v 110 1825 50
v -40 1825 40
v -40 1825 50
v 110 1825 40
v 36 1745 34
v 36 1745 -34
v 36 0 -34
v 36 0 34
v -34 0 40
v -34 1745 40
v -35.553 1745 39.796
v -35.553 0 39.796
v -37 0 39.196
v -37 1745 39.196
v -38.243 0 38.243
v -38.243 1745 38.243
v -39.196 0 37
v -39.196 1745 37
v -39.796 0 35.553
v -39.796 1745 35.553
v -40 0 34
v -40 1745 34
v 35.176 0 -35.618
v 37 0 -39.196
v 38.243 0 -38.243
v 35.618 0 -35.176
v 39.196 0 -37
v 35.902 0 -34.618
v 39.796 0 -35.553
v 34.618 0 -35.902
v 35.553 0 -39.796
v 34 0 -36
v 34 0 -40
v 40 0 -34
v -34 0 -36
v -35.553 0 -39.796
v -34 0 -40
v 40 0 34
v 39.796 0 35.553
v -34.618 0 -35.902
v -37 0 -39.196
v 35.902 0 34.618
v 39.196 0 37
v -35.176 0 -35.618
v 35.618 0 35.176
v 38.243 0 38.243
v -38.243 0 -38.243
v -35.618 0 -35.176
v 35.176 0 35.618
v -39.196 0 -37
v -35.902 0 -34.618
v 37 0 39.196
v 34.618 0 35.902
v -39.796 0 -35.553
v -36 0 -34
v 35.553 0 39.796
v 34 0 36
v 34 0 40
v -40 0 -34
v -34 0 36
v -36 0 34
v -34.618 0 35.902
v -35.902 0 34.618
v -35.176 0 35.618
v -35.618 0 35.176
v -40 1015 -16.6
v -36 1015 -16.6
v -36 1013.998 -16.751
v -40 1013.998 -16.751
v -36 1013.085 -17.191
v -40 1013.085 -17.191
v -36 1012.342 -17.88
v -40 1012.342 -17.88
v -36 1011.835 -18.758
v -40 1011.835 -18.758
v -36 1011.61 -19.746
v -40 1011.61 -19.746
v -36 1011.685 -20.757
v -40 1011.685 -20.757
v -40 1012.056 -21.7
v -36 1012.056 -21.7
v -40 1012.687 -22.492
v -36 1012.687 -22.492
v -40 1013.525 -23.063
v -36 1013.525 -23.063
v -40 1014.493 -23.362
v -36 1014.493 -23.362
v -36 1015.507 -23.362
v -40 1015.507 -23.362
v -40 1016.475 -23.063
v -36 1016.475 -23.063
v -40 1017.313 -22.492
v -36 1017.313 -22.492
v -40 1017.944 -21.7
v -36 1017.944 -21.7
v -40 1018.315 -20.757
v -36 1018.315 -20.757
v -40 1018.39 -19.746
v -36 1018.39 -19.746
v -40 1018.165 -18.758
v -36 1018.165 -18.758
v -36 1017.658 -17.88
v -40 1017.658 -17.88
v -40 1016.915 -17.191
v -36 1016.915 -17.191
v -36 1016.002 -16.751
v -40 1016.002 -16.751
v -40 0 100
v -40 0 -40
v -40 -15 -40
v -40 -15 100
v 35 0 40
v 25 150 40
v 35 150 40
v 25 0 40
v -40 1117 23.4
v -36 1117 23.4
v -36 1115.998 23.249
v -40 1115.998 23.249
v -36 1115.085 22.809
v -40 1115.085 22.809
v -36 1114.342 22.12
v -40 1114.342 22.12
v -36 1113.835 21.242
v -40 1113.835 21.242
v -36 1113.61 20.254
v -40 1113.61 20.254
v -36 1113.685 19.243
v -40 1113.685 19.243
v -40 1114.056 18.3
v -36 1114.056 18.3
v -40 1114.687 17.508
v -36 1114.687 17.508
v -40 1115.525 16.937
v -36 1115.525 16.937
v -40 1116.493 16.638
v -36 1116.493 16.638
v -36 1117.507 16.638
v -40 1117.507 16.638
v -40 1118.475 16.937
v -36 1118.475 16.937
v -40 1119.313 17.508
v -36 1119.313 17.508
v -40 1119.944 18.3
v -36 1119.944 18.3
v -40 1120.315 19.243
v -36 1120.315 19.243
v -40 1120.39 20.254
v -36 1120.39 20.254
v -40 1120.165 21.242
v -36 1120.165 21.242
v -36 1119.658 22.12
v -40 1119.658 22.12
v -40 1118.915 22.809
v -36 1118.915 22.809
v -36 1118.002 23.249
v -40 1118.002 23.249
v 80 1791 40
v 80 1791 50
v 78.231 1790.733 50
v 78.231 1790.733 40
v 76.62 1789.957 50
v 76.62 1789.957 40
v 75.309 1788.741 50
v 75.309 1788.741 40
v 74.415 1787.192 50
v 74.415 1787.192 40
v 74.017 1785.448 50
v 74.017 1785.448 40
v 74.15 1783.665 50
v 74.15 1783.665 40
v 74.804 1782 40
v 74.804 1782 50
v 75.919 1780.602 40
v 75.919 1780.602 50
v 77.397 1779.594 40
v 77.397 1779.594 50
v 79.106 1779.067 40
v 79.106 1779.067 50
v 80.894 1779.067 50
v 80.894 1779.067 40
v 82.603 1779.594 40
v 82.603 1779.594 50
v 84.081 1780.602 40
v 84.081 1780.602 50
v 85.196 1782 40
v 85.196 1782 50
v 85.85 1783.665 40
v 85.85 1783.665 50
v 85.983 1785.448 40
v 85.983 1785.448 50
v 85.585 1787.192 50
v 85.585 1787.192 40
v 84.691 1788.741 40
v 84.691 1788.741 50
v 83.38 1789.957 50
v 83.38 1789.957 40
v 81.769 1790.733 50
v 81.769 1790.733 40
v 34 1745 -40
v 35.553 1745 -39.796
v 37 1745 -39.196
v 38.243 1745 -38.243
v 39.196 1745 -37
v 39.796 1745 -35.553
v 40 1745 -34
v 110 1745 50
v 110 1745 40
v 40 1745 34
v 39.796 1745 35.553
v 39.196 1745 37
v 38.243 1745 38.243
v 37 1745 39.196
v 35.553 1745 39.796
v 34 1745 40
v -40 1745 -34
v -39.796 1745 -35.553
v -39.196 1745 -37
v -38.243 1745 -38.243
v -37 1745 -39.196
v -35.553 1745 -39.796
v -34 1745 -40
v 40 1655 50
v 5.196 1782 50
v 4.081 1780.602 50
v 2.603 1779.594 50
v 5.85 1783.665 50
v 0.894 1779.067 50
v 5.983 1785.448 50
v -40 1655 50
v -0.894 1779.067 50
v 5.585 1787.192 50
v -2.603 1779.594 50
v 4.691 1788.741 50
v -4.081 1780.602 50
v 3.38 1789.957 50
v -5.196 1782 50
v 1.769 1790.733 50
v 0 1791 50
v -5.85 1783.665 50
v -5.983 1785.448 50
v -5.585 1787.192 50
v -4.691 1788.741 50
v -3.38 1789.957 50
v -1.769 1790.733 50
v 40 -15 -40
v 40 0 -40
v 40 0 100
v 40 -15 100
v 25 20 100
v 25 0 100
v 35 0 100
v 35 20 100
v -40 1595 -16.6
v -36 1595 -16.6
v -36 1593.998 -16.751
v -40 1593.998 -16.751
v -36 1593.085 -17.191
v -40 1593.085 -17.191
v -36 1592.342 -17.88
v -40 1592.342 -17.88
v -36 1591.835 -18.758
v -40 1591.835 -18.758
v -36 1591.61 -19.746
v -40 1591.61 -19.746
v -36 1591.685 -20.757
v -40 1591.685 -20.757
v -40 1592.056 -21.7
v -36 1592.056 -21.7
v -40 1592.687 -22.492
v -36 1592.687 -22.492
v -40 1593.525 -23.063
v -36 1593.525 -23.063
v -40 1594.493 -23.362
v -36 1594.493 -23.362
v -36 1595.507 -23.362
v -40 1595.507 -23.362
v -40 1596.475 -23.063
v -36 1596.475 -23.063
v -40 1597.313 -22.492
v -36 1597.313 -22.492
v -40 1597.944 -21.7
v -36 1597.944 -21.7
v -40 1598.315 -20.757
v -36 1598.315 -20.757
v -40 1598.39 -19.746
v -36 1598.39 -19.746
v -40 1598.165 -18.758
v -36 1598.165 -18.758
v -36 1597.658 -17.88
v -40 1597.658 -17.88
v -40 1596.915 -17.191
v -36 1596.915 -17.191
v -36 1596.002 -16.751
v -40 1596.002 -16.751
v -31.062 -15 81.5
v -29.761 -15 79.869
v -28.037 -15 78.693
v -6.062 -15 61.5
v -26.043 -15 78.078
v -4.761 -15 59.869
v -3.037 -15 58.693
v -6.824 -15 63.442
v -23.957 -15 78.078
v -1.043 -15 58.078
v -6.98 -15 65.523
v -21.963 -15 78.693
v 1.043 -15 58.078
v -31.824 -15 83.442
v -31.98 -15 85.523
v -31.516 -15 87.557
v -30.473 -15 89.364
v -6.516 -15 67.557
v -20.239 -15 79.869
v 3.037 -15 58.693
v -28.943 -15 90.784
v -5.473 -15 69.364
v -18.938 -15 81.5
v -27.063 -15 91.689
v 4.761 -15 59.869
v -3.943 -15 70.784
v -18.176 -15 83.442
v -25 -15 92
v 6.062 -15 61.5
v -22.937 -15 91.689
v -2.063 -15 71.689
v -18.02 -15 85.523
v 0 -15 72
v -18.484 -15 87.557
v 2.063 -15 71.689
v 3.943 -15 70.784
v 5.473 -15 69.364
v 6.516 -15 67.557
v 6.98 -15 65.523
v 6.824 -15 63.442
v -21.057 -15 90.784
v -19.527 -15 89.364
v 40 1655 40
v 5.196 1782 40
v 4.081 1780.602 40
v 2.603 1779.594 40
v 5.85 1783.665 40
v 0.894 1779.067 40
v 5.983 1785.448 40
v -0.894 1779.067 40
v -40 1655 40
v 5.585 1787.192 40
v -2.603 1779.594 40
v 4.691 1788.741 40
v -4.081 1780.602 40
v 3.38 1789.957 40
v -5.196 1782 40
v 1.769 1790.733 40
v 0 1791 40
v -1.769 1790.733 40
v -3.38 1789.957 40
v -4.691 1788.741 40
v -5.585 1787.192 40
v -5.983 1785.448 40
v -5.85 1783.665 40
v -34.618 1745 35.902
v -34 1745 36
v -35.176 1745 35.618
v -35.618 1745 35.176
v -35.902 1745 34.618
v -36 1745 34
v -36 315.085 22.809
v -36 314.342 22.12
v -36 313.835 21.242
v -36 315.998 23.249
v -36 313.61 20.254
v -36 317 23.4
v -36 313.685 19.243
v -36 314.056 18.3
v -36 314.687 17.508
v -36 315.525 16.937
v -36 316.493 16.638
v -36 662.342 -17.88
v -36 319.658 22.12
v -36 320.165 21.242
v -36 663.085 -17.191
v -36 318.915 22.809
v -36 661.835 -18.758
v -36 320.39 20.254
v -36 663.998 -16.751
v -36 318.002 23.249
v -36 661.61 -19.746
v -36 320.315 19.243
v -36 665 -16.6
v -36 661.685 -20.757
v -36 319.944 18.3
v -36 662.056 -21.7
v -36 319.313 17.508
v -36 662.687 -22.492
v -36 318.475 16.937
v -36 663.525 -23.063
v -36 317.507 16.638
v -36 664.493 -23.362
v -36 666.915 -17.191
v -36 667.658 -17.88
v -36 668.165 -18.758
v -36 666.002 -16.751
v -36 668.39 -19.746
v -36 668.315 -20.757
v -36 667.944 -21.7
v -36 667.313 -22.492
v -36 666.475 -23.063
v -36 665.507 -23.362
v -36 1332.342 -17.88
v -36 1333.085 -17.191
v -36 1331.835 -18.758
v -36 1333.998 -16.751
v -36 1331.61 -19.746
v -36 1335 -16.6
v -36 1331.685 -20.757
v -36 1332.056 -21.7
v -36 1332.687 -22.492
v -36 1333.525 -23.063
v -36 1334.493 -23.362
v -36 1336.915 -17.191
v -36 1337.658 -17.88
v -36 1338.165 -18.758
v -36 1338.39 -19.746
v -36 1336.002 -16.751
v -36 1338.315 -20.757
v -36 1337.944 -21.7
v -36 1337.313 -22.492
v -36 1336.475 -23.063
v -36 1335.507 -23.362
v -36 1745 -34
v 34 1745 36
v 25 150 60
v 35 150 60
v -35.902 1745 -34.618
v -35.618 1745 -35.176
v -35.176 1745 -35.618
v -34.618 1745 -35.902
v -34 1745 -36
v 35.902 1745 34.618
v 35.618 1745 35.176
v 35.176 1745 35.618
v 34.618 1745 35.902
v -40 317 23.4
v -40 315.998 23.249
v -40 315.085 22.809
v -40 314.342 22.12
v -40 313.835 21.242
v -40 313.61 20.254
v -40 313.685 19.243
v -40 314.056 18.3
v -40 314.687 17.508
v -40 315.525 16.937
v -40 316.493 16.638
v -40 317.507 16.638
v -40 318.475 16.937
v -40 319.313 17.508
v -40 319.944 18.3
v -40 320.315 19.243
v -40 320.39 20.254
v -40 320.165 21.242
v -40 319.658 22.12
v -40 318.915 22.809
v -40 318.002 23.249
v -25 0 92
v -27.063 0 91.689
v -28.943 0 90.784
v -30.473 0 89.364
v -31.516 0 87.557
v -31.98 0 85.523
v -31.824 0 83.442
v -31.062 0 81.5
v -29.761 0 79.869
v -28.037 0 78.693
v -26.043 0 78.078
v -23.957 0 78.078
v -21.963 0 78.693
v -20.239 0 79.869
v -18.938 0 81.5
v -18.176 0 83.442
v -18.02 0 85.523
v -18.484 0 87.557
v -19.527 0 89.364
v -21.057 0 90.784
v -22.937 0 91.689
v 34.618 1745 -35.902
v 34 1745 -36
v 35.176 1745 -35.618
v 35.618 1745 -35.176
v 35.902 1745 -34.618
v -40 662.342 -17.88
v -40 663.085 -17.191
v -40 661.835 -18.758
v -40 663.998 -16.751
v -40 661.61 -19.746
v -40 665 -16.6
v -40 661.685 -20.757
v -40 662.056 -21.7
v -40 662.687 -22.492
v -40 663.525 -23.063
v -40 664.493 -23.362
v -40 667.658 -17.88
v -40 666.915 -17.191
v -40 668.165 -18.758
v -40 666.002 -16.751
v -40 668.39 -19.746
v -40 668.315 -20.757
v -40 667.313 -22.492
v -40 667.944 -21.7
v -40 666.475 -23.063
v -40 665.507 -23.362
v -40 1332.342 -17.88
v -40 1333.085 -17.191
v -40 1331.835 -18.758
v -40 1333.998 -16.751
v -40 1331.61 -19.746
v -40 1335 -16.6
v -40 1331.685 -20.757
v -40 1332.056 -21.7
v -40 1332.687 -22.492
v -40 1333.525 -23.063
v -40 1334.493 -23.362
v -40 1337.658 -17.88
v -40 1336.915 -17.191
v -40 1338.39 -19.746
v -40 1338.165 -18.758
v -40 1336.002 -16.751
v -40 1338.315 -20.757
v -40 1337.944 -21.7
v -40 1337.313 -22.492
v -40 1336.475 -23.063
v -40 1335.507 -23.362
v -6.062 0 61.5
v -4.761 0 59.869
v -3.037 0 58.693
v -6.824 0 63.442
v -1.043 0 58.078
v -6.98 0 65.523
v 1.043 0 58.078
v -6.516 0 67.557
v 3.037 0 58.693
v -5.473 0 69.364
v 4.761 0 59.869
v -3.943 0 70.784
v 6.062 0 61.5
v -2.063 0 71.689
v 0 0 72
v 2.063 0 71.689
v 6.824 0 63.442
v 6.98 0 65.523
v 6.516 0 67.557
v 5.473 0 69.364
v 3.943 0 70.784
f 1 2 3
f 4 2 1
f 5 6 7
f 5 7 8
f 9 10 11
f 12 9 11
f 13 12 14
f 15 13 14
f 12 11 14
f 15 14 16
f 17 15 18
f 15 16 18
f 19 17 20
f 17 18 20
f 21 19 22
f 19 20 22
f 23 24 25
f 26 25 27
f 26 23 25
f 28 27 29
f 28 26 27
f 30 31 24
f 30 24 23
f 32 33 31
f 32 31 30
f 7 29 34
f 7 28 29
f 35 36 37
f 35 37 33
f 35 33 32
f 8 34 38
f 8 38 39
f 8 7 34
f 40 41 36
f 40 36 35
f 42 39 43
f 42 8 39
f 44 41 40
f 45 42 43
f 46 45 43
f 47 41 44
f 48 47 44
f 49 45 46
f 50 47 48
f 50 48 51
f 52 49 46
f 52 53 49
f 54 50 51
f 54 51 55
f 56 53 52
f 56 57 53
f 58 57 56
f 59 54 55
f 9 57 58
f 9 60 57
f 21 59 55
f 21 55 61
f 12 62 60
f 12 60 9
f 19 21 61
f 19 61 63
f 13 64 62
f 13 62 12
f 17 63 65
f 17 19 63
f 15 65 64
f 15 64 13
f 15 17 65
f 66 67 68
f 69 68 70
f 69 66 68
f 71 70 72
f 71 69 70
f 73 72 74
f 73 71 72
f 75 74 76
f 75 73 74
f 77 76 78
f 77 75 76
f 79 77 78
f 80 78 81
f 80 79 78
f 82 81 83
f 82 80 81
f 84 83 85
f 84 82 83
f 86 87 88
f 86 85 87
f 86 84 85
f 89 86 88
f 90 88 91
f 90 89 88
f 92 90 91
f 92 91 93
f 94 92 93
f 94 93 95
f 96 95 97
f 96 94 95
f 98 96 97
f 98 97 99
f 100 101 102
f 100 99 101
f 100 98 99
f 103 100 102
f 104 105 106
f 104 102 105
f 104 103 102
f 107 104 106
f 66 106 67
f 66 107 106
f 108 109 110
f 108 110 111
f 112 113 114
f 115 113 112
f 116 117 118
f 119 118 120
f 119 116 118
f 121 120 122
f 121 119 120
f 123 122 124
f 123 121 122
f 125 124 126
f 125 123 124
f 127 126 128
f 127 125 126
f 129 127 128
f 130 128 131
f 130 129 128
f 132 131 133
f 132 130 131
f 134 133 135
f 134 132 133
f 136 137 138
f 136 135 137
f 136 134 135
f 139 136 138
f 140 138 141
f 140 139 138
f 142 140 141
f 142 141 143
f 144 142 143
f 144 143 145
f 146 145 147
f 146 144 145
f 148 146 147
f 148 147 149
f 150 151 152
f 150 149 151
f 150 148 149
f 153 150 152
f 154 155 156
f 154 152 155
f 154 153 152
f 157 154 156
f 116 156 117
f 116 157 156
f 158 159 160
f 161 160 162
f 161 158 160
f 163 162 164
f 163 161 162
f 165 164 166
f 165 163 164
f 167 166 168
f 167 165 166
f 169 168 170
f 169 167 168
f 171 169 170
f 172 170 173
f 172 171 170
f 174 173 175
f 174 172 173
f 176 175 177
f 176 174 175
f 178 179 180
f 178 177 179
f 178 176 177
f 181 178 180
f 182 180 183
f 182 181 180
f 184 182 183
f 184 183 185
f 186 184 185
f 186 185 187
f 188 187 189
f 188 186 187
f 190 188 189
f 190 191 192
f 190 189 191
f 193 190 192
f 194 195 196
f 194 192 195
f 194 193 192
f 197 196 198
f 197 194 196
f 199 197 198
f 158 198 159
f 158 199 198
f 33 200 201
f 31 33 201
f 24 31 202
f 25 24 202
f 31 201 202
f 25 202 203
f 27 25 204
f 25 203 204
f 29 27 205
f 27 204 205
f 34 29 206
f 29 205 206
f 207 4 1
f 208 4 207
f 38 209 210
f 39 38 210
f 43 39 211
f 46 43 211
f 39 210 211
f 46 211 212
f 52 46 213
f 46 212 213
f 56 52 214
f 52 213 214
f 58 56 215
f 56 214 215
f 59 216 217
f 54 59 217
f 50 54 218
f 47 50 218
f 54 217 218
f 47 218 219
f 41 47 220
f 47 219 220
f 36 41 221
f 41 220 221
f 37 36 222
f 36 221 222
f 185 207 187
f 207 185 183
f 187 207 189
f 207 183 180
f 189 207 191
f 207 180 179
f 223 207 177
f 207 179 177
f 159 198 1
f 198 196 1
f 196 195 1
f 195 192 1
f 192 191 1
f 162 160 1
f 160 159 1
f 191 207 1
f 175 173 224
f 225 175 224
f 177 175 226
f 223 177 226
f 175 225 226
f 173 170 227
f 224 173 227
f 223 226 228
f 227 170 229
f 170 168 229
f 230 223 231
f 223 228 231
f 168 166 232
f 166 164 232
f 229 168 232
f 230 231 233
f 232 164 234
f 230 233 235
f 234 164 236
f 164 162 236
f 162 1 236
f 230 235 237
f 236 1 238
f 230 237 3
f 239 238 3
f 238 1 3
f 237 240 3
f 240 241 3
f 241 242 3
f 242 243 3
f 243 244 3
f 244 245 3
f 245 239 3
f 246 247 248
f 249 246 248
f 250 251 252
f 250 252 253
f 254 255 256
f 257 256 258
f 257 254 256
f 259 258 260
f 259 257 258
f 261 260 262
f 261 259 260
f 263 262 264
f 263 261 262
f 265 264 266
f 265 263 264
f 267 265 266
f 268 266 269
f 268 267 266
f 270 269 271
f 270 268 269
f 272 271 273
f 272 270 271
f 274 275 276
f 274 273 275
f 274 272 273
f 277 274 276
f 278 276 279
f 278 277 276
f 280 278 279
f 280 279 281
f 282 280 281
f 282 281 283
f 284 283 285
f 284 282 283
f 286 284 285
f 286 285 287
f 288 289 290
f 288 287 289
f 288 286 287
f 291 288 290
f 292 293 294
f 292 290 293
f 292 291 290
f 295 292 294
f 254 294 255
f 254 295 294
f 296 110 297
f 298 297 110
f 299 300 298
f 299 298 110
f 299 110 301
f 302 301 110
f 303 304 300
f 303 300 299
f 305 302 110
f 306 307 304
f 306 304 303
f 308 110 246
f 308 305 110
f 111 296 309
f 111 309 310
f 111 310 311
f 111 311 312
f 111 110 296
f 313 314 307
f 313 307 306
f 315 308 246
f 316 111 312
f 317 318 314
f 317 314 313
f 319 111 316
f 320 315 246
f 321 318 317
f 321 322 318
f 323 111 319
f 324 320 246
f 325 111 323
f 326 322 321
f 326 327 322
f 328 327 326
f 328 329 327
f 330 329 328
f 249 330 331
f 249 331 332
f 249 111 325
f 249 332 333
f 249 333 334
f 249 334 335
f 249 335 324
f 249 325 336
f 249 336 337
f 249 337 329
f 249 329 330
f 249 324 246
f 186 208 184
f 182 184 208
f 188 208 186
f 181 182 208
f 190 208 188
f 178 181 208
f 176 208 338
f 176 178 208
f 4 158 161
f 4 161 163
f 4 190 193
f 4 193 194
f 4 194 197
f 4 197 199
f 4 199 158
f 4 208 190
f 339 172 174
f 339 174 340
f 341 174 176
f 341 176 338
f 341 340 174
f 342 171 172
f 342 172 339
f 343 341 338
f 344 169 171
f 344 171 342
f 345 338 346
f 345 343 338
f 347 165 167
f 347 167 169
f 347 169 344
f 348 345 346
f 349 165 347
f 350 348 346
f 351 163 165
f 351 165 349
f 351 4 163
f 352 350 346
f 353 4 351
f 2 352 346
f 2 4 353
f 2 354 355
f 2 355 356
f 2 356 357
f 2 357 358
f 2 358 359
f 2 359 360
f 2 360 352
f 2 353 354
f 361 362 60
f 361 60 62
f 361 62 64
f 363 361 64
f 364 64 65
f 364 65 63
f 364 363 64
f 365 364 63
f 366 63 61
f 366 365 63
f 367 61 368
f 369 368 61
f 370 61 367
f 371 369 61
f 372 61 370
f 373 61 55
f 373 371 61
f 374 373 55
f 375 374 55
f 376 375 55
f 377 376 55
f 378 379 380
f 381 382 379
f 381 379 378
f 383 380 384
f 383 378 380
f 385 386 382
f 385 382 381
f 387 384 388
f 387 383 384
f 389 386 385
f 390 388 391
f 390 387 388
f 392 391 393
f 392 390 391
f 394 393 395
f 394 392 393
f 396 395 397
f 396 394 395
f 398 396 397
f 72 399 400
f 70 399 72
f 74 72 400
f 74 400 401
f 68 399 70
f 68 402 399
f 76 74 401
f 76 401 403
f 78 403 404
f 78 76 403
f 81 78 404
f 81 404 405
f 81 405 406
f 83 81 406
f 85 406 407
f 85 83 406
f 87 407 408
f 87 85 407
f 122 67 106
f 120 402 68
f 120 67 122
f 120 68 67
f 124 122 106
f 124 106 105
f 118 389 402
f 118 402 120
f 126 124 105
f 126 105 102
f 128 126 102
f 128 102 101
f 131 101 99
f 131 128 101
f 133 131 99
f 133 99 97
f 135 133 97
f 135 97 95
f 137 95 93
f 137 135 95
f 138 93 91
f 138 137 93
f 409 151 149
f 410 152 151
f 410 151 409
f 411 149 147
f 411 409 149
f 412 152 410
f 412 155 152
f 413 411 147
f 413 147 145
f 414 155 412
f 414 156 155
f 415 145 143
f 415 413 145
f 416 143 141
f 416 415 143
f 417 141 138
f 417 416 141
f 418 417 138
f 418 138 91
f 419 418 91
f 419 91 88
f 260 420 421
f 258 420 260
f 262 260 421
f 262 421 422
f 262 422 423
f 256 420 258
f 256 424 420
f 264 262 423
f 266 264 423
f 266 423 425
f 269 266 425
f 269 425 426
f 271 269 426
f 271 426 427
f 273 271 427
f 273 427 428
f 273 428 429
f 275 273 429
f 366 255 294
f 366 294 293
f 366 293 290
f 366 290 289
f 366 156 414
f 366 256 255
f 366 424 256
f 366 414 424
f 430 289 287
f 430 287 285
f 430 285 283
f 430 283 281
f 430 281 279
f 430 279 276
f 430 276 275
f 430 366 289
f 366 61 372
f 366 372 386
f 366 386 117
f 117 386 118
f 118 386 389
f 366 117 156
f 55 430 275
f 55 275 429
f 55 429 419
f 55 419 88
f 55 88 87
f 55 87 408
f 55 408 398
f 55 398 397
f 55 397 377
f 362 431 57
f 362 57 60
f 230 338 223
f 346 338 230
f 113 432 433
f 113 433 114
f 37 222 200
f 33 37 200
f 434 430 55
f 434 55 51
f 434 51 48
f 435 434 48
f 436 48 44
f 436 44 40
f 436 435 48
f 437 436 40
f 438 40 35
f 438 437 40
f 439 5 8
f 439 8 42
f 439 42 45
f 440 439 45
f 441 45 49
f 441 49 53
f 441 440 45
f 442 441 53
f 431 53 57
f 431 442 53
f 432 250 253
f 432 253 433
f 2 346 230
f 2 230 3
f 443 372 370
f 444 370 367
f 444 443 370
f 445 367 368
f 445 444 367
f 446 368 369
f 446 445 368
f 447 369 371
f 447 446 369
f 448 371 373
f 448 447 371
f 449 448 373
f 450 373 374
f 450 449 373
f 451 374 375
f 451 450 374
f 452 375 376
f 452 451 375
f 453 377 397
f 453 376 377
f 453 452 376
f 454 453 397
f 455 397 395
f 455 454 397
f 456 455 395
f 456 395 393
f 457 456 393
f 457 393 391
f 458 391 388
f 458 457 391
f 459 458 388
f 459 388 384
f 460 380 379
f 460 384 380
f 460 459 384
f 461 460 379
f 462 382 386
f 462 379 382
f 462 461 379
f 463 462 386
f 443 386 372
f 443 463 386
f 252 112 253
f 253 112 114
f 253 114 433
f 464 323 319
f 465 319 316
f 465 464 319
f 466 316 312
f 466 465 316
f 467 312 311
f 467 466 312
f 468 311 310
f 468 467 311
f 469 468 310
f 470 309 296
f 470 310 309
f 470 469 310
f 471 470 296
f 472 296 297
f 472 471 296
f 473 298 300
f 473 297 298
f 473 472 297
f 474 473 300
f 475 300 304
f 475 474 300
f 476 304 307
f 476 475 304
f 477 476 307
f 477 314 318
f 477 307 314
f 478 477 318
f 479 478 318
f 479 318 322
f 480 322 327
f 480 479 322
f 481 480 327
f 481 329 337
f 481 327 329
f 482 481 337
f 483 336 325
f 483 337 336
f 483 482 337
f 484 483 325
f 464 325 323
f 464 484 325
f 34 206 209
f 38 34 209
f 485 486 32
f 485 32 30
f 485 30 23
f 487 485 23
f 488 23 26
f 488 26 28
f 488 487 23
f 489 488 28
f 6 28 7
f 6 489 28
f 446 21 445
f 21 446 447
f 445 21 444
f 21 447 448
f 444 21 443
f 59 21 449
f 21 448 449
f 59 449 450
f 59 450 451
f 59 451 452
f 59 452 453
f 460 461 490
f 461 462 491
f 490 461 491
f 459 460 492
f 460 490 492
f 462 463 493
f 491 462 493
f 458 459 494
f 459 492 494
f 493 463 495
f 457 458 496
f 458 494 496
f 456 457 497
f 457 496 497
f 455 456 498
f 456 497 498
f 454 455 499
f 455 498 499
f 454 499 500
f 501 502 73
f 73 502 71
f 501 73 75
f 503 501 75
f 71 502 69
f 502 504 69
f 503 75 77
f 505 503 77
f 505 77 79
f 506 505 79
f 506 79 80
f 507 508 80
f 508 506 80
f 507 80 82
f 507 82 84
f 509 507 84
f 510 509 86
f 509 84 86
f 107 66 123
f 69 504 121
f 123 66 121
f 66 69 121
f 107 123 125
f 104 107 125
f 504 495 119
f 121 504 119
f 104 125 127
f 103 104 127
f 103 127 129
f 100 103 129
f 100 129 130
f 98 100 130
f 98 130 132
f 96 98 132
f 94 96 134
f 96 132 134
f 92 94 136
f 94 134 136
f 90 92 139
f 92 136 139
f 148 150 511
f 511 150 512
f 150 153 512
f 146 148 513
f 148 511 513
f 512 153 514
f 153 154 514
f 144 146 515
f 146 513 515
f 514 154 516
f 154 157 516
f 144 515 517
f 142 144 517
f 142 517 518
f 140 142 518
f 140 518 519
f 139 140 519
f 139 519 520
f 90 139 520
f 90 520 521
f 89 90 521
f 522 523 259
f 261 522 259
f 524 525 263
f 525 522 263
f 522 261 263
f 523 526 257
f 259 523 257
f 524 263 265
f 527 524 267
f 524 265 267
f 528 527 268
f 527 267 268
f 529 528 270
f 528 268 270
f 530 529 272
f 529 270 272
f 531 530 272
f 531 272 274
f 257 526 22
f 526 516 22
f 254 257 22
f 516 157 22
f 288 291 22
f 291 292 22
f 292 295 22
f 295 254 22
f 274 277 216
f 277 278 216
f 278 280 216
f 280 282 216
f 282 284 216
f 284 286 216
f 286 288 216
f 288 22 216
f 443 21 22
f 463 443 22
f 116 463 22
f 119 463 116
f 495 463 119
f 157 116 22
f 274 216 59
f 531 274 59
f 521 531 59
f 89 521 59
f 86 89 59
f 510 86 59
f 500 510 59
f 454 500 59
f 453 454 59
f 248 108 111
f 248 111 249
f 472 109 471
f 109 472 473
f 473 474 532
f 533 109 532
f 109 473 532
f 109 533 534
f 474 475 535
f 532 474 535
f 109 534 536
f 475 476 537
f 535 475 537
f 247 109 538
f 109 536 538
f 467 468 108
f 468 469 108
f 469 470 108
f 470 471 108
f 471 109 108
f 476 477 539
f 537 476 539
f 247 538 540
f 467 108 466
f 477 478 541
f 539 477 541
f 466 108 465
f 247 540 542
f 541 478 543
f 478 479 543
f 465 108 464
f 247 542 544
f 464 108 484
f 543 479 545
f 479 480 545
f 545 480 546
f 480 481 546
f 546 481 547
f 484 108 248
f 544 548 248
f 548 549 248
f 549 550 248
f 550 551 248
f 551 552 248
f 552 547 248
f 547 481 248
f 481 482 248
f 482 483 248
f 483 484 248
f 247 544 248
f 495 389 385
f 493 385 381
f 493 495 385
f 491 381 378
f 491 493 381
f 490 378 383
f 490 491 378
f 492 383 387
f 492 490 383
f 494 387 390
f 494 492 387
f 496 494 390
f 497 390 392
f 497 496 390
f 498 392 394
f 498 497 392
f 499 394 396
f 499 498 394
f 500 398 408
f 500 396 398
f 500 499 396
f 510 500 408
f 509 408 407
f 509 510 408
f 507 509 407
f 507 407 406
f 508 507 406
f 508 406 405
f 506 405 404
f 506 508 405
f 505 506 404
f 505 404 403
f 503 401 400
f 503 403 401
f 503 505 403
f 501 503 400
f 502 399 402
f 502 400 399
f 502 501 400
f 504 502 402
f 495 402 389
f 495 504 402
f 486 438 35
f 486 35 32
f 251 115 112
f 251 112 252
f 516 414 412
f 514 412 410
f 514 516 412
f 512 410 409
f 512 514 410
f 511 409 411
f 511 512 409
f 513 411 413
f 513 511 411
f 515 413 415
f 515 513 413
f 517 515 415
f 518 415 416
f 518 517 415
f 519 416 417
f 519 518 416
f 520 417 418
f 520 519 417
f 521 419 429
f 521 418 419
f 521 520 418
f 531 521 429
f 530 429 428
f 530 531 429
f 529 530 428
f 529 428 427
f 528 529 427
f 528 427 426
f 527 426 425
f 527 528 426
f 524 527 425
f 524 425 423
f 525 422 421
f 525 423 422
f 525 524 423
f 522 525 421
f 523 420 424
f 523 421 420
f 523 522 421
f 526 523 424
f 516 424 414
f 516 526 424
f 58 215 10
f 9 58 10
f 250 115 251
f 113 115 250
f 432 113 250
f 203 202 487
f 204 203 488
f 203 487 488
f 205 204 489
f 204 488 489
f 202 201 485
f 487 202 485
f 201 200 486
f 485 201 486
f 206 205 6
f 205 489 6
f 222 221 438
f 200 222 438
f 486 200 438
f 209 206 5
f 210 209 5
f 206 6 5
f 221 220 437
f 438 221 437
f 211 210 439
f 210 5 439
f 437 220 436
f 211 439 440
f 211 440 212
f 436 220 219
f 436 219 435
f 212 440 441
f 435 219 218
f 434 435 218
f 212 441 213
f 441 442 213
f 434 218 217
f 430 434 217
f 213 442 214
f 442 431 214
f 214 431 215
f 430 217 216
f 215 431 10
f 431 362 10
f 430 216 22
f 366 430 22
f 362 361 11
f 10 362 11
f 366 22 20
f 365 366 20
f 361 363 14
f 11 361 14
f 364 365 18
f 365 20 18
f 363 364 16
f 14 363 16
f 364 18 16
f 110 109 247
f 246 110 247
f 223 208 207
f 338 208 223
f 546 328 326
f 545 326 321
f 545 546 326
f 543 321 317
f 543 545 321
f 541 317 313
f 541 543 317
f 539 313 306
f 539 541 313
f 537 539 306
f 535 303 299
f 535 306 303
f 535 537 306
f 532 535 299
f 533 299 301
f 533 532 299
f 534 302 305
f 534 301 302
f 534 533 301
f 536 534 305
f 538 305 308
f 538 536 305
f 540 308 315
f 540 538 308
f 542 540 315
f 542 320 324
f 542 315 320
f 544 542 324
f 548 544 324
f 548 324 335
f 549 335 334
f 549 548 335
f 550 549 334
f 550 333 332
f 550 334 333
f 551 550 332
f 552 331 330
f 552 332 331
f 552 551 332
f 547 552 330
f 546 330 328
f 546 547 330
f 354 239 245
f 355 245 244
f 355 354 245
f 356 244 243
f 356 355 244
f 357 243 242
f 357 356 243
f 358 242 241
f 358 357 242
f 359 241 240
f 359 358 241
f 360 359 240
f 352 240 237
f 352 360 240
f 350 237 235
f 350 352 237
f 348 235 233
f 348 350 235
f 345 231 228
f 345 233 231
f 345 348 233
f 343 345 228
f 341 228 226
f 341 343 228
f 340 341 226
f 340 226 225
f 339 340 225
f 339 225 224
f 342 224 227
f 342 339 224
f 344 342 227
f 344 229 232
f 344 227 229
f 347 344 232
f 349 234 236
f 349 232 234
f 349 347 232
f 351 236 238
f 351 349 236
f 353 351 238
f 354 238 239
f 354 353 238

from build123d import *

# Parameters (mm, degrees)
MEMBER_1_DEPTH                   = 1745
SKETCH_4_W                       = 80
SKETCH_4_H                       = 140
EXTRUDE_1_DEPTH                  = 15
HOLE_WIZARD_14_0_14_1_AT_2_COUNT = 2
HOLE_WIZARD_14_0_14_1_AT_2_PITCH = 32.015621187
EXTRUDE_2_DEPTH                  = 10
EXTRUDE_3_DEPTH                  = 10
HOLE_WIZARD_M10_1_AT_2_COUNT     = 2
HOLE_WIZARD_M10_1_AT_2_PITCH     = 80
HOLE_WIZARD_M8_2_AT_2_COUNT      = 2
HOLE_WIZARD_M8_2_AT_2_PITCH      = 670
HOLE_WIZARD_M8_2_AT_3_COUNT      = 2
HOLE_WIZARD_M8_2_AT_3_PITCH      = 350
HOLE_WIZARD_M8_2_AT_4_COUNT      = 2
HOLE_WIZARD_M8_2_AT_4_PITCH      = 930
HOLE_WIZARD_M8_7_AT_2_COUNT      = 2
HOLE_WIZARD_M8_7_AT_2_PITCH      = 800


with BuildPart() as part:
    # Sketch11 → Member 1 (new body)
    with BuildSketch(Plane(origin=(0, 1745, 0), x_dir=(0, 0, 1), z_dir=(0, -1, 0))):
        with BuildLine():
            Line((-34, -40), (34, -40))
            ThreePointArc((34, -40), (38.242640687, -38.242640687), (40, -34))
            Line((40, -34), (40, 34))
            ThreePointArc((40, 34), (38.242640687, 38.242640687), (34, 40))
            Line((34, 40), (-34, 40))
            ThreePointArc((-34, 40), (-38.242640687, 38.242640687), (-40, 34))
            Line((-40, 34), (-40, -34))
            ThreePointArc((-40, -34), (-38.242640687, -38.242640687), (-34, -40))
        make_face()
        with BuildLine():
            Line((-34, -36), (34, -36))
            ThreePointArc((34, -36), (35.414213562, -35.414213562), (36, -34))
            Line((36, -34), (36, 34))
            ThreePointArc((36, 34), (35.414213562, 35.414213562), (34, 36))
            Line((34, 36), (-34, 36))
            ThreePointArc((-34, 36), (-35.414213562, 35.414213562), (-36, 34))
            Line((-36, 34), (-36, -34))
            ThreePointArc((-36, -34), (-35.414213562, -35.414213562), (-34, -36))
        make_face(mode=Mode.SUBTRACT)
    extrude(amount=MEMBER_1_DEPTH)

    # 草图33 → M8 螺纹孔2 (revolve, cut)
    with BuildSketch(Plane(origin=(-40, 665, -20), x_dir=(0, 0, 1), z_dir=(0, 1, 0))):
        Polygon((0, 0), (0, 21.792926105), (3.4, 19.75), (3.4, 0), align=None)
    hole_wizard_m8_2 = revolve(axis=Axis((-46.35, 665, -20), (1, 0, 0)), mode=Mode.SUBTRACT)

    # M8 螺纹孔2 at 2: M8 螺纹孔2 ×2
    with Locations(*[(0, i * HOLE_WIZARD_M8_2_AT_2_PITCH, 0) for i in range(1, HOLE_WIZARD_M8_2_AT_2_COUNT)]):
        add(hole_wizard_m8_2, mode=Mode.SUBTRACT)

    # M8 螺纹孔2 at 3: M8 螺纹孔2 ×2
    with Locations(*[(0, i * HOLE_WIZARD_M8_2_AT_3_PITCH, 0) for i in range(1, HOLE_WIZARD_M8_2_AT_3_COUNT)]):
        add(hole_wizard_m8_2, mode=Mode.SUBTRACT)

    # M8 螺纹孔2 at 4: M8 螺纹孔2 ×2
    with Locations(*[(0, i * HOLE_WIZARD_M8_2_AT_4_PITCH, 0) for i in range(1, HOLE_WIZARD_M8_2_AT_4_COUNT)]):
        add(hole_wizard_m8_2, mode=Mode.SUBTRACT)

    # 草图43 → M8 螺纹孔7 (revolve, cut)
    with BuildSketch(Plane(origin=(-40, 1117, 20.000000001), x_dir=(0, 0, 1), z_dir=(0, 1, 0))):
        Polygon((0, 0), (0, 24.292926105), (3.4, 22.25), (3.4, 0), align=None)
    hole_wizard_m8_7 = revolve(axis=Axis((-46.35, 1117, 20.000000001), (1, 0, 0)), mode=Mode.SUBTRACT)

    # M8 螺纹孔7 at 2: M8 螺纹孔7 ×2
    with Locations(*[(0, -i * HOLE_WIZARD_M8_7_AT_2_PITCH, 0) for i in range(1, HOLE_WIZARD_M8_7_AT_2_COUNT)]):
        add(hole_wizard_m8_7, mode=Mode.SUBTRACT)


with BuildPart() as body_2:
    # 草图4 → 凸台-拉伸1 (new body)
    with BuildSketch(Plane.XZ):
        with Locations((0, 30)):
            Rectangle(SKETCH_4_W, SKETCH_4_H)
    extrude(amount=EXTRUDE_1_DEPTH)

    # 草图12 → Ø14.0 (14) 直径孔1 (revolve, cut)
    with BuildSketch(Plane(origin=(-25, 0, 85), x_dir=(0, 0, 1), z_dir=(1, 0, 0))):
        Polygon((0, 0), (0, 44.206024333), (7, 40), (7, 0), align=None)
    hole_wizard_14_0_14_1 = revolve(axis=Axis((-25, 6.35, 85), (0, -1, 0)), mode=Mode.SUBTRACT)

    # Ø14.0 (14) 直径孔1 at 2: Ø14.0 (14) 直径孔1 ×2
    with Locations(*[Vector(0.7808688094430305, 0, -0.6246950475544242) * (i * HOLE_WIZARD_14_0_14_1_AT_2_PITCH) for i in range(1, HOLE_WIZARD_14_0_14_1_AT_2_COUNT)]):
        add(hole_wizard_14_0_14_1, mode=Mode.SUBTRACT)


with BuildPart() as body_3:
    # 草图11 → 凸台-拉伸2 (new body)
    with BuildSketch(Plane(origin=(25, 0, 0), x_dir=(0, 0, -1), z_dir=(1, 0, 0))):
        Polygon((-100, 20), (-60, 150), (-40, 150), (-40, 0), (-100, 0), align=None)
    extrude(amount=EXTRUDE_2_DEPTH)


with BuildPart() as body_4:
    # 草图22 → 凸台-拉伸3 (new body)
    with BuildSketch(Plane.XY.offset(40)):
        Polygon((-40, 1655), (-40, 1825), (110, 1825), (110, 1745), (40, 1655), align=None)
    extrude(amount=EXTRUDE_3_DEPTH)

    # 草图29 → M10 间隙孔1 (revolve, cut)
    with BuildSketch(Plane(origin=(80, 1785, 40), x_dir=(0, 1, 0), z_dir=(1, 0, 0))):
        Polygon((0, 0), (0, 33.605163714), (6, 30), (6, 0), align=None)
    hole_wizard_m10_1 = revolve(axis=Axis((80, 1785, 33.65), (0, 0, 1)), mode=Mode.SUBTRACT)

    # M10 间隙孔1 at 2: M10 间隙孔1 ×2
    with Locations(*[(-i * HOLE_WIZARD_M10_1_AT_2_PITCH, 0, 0) for i in range(1, HOLE_WIZARD_M10_1_AT_2_COUNT)]):
        add(hole_wizard_m10_1, mode=Mode.SUBTRACT)


solid = Compound([part.part, body_2.part, body_3.part, body_4.part])
